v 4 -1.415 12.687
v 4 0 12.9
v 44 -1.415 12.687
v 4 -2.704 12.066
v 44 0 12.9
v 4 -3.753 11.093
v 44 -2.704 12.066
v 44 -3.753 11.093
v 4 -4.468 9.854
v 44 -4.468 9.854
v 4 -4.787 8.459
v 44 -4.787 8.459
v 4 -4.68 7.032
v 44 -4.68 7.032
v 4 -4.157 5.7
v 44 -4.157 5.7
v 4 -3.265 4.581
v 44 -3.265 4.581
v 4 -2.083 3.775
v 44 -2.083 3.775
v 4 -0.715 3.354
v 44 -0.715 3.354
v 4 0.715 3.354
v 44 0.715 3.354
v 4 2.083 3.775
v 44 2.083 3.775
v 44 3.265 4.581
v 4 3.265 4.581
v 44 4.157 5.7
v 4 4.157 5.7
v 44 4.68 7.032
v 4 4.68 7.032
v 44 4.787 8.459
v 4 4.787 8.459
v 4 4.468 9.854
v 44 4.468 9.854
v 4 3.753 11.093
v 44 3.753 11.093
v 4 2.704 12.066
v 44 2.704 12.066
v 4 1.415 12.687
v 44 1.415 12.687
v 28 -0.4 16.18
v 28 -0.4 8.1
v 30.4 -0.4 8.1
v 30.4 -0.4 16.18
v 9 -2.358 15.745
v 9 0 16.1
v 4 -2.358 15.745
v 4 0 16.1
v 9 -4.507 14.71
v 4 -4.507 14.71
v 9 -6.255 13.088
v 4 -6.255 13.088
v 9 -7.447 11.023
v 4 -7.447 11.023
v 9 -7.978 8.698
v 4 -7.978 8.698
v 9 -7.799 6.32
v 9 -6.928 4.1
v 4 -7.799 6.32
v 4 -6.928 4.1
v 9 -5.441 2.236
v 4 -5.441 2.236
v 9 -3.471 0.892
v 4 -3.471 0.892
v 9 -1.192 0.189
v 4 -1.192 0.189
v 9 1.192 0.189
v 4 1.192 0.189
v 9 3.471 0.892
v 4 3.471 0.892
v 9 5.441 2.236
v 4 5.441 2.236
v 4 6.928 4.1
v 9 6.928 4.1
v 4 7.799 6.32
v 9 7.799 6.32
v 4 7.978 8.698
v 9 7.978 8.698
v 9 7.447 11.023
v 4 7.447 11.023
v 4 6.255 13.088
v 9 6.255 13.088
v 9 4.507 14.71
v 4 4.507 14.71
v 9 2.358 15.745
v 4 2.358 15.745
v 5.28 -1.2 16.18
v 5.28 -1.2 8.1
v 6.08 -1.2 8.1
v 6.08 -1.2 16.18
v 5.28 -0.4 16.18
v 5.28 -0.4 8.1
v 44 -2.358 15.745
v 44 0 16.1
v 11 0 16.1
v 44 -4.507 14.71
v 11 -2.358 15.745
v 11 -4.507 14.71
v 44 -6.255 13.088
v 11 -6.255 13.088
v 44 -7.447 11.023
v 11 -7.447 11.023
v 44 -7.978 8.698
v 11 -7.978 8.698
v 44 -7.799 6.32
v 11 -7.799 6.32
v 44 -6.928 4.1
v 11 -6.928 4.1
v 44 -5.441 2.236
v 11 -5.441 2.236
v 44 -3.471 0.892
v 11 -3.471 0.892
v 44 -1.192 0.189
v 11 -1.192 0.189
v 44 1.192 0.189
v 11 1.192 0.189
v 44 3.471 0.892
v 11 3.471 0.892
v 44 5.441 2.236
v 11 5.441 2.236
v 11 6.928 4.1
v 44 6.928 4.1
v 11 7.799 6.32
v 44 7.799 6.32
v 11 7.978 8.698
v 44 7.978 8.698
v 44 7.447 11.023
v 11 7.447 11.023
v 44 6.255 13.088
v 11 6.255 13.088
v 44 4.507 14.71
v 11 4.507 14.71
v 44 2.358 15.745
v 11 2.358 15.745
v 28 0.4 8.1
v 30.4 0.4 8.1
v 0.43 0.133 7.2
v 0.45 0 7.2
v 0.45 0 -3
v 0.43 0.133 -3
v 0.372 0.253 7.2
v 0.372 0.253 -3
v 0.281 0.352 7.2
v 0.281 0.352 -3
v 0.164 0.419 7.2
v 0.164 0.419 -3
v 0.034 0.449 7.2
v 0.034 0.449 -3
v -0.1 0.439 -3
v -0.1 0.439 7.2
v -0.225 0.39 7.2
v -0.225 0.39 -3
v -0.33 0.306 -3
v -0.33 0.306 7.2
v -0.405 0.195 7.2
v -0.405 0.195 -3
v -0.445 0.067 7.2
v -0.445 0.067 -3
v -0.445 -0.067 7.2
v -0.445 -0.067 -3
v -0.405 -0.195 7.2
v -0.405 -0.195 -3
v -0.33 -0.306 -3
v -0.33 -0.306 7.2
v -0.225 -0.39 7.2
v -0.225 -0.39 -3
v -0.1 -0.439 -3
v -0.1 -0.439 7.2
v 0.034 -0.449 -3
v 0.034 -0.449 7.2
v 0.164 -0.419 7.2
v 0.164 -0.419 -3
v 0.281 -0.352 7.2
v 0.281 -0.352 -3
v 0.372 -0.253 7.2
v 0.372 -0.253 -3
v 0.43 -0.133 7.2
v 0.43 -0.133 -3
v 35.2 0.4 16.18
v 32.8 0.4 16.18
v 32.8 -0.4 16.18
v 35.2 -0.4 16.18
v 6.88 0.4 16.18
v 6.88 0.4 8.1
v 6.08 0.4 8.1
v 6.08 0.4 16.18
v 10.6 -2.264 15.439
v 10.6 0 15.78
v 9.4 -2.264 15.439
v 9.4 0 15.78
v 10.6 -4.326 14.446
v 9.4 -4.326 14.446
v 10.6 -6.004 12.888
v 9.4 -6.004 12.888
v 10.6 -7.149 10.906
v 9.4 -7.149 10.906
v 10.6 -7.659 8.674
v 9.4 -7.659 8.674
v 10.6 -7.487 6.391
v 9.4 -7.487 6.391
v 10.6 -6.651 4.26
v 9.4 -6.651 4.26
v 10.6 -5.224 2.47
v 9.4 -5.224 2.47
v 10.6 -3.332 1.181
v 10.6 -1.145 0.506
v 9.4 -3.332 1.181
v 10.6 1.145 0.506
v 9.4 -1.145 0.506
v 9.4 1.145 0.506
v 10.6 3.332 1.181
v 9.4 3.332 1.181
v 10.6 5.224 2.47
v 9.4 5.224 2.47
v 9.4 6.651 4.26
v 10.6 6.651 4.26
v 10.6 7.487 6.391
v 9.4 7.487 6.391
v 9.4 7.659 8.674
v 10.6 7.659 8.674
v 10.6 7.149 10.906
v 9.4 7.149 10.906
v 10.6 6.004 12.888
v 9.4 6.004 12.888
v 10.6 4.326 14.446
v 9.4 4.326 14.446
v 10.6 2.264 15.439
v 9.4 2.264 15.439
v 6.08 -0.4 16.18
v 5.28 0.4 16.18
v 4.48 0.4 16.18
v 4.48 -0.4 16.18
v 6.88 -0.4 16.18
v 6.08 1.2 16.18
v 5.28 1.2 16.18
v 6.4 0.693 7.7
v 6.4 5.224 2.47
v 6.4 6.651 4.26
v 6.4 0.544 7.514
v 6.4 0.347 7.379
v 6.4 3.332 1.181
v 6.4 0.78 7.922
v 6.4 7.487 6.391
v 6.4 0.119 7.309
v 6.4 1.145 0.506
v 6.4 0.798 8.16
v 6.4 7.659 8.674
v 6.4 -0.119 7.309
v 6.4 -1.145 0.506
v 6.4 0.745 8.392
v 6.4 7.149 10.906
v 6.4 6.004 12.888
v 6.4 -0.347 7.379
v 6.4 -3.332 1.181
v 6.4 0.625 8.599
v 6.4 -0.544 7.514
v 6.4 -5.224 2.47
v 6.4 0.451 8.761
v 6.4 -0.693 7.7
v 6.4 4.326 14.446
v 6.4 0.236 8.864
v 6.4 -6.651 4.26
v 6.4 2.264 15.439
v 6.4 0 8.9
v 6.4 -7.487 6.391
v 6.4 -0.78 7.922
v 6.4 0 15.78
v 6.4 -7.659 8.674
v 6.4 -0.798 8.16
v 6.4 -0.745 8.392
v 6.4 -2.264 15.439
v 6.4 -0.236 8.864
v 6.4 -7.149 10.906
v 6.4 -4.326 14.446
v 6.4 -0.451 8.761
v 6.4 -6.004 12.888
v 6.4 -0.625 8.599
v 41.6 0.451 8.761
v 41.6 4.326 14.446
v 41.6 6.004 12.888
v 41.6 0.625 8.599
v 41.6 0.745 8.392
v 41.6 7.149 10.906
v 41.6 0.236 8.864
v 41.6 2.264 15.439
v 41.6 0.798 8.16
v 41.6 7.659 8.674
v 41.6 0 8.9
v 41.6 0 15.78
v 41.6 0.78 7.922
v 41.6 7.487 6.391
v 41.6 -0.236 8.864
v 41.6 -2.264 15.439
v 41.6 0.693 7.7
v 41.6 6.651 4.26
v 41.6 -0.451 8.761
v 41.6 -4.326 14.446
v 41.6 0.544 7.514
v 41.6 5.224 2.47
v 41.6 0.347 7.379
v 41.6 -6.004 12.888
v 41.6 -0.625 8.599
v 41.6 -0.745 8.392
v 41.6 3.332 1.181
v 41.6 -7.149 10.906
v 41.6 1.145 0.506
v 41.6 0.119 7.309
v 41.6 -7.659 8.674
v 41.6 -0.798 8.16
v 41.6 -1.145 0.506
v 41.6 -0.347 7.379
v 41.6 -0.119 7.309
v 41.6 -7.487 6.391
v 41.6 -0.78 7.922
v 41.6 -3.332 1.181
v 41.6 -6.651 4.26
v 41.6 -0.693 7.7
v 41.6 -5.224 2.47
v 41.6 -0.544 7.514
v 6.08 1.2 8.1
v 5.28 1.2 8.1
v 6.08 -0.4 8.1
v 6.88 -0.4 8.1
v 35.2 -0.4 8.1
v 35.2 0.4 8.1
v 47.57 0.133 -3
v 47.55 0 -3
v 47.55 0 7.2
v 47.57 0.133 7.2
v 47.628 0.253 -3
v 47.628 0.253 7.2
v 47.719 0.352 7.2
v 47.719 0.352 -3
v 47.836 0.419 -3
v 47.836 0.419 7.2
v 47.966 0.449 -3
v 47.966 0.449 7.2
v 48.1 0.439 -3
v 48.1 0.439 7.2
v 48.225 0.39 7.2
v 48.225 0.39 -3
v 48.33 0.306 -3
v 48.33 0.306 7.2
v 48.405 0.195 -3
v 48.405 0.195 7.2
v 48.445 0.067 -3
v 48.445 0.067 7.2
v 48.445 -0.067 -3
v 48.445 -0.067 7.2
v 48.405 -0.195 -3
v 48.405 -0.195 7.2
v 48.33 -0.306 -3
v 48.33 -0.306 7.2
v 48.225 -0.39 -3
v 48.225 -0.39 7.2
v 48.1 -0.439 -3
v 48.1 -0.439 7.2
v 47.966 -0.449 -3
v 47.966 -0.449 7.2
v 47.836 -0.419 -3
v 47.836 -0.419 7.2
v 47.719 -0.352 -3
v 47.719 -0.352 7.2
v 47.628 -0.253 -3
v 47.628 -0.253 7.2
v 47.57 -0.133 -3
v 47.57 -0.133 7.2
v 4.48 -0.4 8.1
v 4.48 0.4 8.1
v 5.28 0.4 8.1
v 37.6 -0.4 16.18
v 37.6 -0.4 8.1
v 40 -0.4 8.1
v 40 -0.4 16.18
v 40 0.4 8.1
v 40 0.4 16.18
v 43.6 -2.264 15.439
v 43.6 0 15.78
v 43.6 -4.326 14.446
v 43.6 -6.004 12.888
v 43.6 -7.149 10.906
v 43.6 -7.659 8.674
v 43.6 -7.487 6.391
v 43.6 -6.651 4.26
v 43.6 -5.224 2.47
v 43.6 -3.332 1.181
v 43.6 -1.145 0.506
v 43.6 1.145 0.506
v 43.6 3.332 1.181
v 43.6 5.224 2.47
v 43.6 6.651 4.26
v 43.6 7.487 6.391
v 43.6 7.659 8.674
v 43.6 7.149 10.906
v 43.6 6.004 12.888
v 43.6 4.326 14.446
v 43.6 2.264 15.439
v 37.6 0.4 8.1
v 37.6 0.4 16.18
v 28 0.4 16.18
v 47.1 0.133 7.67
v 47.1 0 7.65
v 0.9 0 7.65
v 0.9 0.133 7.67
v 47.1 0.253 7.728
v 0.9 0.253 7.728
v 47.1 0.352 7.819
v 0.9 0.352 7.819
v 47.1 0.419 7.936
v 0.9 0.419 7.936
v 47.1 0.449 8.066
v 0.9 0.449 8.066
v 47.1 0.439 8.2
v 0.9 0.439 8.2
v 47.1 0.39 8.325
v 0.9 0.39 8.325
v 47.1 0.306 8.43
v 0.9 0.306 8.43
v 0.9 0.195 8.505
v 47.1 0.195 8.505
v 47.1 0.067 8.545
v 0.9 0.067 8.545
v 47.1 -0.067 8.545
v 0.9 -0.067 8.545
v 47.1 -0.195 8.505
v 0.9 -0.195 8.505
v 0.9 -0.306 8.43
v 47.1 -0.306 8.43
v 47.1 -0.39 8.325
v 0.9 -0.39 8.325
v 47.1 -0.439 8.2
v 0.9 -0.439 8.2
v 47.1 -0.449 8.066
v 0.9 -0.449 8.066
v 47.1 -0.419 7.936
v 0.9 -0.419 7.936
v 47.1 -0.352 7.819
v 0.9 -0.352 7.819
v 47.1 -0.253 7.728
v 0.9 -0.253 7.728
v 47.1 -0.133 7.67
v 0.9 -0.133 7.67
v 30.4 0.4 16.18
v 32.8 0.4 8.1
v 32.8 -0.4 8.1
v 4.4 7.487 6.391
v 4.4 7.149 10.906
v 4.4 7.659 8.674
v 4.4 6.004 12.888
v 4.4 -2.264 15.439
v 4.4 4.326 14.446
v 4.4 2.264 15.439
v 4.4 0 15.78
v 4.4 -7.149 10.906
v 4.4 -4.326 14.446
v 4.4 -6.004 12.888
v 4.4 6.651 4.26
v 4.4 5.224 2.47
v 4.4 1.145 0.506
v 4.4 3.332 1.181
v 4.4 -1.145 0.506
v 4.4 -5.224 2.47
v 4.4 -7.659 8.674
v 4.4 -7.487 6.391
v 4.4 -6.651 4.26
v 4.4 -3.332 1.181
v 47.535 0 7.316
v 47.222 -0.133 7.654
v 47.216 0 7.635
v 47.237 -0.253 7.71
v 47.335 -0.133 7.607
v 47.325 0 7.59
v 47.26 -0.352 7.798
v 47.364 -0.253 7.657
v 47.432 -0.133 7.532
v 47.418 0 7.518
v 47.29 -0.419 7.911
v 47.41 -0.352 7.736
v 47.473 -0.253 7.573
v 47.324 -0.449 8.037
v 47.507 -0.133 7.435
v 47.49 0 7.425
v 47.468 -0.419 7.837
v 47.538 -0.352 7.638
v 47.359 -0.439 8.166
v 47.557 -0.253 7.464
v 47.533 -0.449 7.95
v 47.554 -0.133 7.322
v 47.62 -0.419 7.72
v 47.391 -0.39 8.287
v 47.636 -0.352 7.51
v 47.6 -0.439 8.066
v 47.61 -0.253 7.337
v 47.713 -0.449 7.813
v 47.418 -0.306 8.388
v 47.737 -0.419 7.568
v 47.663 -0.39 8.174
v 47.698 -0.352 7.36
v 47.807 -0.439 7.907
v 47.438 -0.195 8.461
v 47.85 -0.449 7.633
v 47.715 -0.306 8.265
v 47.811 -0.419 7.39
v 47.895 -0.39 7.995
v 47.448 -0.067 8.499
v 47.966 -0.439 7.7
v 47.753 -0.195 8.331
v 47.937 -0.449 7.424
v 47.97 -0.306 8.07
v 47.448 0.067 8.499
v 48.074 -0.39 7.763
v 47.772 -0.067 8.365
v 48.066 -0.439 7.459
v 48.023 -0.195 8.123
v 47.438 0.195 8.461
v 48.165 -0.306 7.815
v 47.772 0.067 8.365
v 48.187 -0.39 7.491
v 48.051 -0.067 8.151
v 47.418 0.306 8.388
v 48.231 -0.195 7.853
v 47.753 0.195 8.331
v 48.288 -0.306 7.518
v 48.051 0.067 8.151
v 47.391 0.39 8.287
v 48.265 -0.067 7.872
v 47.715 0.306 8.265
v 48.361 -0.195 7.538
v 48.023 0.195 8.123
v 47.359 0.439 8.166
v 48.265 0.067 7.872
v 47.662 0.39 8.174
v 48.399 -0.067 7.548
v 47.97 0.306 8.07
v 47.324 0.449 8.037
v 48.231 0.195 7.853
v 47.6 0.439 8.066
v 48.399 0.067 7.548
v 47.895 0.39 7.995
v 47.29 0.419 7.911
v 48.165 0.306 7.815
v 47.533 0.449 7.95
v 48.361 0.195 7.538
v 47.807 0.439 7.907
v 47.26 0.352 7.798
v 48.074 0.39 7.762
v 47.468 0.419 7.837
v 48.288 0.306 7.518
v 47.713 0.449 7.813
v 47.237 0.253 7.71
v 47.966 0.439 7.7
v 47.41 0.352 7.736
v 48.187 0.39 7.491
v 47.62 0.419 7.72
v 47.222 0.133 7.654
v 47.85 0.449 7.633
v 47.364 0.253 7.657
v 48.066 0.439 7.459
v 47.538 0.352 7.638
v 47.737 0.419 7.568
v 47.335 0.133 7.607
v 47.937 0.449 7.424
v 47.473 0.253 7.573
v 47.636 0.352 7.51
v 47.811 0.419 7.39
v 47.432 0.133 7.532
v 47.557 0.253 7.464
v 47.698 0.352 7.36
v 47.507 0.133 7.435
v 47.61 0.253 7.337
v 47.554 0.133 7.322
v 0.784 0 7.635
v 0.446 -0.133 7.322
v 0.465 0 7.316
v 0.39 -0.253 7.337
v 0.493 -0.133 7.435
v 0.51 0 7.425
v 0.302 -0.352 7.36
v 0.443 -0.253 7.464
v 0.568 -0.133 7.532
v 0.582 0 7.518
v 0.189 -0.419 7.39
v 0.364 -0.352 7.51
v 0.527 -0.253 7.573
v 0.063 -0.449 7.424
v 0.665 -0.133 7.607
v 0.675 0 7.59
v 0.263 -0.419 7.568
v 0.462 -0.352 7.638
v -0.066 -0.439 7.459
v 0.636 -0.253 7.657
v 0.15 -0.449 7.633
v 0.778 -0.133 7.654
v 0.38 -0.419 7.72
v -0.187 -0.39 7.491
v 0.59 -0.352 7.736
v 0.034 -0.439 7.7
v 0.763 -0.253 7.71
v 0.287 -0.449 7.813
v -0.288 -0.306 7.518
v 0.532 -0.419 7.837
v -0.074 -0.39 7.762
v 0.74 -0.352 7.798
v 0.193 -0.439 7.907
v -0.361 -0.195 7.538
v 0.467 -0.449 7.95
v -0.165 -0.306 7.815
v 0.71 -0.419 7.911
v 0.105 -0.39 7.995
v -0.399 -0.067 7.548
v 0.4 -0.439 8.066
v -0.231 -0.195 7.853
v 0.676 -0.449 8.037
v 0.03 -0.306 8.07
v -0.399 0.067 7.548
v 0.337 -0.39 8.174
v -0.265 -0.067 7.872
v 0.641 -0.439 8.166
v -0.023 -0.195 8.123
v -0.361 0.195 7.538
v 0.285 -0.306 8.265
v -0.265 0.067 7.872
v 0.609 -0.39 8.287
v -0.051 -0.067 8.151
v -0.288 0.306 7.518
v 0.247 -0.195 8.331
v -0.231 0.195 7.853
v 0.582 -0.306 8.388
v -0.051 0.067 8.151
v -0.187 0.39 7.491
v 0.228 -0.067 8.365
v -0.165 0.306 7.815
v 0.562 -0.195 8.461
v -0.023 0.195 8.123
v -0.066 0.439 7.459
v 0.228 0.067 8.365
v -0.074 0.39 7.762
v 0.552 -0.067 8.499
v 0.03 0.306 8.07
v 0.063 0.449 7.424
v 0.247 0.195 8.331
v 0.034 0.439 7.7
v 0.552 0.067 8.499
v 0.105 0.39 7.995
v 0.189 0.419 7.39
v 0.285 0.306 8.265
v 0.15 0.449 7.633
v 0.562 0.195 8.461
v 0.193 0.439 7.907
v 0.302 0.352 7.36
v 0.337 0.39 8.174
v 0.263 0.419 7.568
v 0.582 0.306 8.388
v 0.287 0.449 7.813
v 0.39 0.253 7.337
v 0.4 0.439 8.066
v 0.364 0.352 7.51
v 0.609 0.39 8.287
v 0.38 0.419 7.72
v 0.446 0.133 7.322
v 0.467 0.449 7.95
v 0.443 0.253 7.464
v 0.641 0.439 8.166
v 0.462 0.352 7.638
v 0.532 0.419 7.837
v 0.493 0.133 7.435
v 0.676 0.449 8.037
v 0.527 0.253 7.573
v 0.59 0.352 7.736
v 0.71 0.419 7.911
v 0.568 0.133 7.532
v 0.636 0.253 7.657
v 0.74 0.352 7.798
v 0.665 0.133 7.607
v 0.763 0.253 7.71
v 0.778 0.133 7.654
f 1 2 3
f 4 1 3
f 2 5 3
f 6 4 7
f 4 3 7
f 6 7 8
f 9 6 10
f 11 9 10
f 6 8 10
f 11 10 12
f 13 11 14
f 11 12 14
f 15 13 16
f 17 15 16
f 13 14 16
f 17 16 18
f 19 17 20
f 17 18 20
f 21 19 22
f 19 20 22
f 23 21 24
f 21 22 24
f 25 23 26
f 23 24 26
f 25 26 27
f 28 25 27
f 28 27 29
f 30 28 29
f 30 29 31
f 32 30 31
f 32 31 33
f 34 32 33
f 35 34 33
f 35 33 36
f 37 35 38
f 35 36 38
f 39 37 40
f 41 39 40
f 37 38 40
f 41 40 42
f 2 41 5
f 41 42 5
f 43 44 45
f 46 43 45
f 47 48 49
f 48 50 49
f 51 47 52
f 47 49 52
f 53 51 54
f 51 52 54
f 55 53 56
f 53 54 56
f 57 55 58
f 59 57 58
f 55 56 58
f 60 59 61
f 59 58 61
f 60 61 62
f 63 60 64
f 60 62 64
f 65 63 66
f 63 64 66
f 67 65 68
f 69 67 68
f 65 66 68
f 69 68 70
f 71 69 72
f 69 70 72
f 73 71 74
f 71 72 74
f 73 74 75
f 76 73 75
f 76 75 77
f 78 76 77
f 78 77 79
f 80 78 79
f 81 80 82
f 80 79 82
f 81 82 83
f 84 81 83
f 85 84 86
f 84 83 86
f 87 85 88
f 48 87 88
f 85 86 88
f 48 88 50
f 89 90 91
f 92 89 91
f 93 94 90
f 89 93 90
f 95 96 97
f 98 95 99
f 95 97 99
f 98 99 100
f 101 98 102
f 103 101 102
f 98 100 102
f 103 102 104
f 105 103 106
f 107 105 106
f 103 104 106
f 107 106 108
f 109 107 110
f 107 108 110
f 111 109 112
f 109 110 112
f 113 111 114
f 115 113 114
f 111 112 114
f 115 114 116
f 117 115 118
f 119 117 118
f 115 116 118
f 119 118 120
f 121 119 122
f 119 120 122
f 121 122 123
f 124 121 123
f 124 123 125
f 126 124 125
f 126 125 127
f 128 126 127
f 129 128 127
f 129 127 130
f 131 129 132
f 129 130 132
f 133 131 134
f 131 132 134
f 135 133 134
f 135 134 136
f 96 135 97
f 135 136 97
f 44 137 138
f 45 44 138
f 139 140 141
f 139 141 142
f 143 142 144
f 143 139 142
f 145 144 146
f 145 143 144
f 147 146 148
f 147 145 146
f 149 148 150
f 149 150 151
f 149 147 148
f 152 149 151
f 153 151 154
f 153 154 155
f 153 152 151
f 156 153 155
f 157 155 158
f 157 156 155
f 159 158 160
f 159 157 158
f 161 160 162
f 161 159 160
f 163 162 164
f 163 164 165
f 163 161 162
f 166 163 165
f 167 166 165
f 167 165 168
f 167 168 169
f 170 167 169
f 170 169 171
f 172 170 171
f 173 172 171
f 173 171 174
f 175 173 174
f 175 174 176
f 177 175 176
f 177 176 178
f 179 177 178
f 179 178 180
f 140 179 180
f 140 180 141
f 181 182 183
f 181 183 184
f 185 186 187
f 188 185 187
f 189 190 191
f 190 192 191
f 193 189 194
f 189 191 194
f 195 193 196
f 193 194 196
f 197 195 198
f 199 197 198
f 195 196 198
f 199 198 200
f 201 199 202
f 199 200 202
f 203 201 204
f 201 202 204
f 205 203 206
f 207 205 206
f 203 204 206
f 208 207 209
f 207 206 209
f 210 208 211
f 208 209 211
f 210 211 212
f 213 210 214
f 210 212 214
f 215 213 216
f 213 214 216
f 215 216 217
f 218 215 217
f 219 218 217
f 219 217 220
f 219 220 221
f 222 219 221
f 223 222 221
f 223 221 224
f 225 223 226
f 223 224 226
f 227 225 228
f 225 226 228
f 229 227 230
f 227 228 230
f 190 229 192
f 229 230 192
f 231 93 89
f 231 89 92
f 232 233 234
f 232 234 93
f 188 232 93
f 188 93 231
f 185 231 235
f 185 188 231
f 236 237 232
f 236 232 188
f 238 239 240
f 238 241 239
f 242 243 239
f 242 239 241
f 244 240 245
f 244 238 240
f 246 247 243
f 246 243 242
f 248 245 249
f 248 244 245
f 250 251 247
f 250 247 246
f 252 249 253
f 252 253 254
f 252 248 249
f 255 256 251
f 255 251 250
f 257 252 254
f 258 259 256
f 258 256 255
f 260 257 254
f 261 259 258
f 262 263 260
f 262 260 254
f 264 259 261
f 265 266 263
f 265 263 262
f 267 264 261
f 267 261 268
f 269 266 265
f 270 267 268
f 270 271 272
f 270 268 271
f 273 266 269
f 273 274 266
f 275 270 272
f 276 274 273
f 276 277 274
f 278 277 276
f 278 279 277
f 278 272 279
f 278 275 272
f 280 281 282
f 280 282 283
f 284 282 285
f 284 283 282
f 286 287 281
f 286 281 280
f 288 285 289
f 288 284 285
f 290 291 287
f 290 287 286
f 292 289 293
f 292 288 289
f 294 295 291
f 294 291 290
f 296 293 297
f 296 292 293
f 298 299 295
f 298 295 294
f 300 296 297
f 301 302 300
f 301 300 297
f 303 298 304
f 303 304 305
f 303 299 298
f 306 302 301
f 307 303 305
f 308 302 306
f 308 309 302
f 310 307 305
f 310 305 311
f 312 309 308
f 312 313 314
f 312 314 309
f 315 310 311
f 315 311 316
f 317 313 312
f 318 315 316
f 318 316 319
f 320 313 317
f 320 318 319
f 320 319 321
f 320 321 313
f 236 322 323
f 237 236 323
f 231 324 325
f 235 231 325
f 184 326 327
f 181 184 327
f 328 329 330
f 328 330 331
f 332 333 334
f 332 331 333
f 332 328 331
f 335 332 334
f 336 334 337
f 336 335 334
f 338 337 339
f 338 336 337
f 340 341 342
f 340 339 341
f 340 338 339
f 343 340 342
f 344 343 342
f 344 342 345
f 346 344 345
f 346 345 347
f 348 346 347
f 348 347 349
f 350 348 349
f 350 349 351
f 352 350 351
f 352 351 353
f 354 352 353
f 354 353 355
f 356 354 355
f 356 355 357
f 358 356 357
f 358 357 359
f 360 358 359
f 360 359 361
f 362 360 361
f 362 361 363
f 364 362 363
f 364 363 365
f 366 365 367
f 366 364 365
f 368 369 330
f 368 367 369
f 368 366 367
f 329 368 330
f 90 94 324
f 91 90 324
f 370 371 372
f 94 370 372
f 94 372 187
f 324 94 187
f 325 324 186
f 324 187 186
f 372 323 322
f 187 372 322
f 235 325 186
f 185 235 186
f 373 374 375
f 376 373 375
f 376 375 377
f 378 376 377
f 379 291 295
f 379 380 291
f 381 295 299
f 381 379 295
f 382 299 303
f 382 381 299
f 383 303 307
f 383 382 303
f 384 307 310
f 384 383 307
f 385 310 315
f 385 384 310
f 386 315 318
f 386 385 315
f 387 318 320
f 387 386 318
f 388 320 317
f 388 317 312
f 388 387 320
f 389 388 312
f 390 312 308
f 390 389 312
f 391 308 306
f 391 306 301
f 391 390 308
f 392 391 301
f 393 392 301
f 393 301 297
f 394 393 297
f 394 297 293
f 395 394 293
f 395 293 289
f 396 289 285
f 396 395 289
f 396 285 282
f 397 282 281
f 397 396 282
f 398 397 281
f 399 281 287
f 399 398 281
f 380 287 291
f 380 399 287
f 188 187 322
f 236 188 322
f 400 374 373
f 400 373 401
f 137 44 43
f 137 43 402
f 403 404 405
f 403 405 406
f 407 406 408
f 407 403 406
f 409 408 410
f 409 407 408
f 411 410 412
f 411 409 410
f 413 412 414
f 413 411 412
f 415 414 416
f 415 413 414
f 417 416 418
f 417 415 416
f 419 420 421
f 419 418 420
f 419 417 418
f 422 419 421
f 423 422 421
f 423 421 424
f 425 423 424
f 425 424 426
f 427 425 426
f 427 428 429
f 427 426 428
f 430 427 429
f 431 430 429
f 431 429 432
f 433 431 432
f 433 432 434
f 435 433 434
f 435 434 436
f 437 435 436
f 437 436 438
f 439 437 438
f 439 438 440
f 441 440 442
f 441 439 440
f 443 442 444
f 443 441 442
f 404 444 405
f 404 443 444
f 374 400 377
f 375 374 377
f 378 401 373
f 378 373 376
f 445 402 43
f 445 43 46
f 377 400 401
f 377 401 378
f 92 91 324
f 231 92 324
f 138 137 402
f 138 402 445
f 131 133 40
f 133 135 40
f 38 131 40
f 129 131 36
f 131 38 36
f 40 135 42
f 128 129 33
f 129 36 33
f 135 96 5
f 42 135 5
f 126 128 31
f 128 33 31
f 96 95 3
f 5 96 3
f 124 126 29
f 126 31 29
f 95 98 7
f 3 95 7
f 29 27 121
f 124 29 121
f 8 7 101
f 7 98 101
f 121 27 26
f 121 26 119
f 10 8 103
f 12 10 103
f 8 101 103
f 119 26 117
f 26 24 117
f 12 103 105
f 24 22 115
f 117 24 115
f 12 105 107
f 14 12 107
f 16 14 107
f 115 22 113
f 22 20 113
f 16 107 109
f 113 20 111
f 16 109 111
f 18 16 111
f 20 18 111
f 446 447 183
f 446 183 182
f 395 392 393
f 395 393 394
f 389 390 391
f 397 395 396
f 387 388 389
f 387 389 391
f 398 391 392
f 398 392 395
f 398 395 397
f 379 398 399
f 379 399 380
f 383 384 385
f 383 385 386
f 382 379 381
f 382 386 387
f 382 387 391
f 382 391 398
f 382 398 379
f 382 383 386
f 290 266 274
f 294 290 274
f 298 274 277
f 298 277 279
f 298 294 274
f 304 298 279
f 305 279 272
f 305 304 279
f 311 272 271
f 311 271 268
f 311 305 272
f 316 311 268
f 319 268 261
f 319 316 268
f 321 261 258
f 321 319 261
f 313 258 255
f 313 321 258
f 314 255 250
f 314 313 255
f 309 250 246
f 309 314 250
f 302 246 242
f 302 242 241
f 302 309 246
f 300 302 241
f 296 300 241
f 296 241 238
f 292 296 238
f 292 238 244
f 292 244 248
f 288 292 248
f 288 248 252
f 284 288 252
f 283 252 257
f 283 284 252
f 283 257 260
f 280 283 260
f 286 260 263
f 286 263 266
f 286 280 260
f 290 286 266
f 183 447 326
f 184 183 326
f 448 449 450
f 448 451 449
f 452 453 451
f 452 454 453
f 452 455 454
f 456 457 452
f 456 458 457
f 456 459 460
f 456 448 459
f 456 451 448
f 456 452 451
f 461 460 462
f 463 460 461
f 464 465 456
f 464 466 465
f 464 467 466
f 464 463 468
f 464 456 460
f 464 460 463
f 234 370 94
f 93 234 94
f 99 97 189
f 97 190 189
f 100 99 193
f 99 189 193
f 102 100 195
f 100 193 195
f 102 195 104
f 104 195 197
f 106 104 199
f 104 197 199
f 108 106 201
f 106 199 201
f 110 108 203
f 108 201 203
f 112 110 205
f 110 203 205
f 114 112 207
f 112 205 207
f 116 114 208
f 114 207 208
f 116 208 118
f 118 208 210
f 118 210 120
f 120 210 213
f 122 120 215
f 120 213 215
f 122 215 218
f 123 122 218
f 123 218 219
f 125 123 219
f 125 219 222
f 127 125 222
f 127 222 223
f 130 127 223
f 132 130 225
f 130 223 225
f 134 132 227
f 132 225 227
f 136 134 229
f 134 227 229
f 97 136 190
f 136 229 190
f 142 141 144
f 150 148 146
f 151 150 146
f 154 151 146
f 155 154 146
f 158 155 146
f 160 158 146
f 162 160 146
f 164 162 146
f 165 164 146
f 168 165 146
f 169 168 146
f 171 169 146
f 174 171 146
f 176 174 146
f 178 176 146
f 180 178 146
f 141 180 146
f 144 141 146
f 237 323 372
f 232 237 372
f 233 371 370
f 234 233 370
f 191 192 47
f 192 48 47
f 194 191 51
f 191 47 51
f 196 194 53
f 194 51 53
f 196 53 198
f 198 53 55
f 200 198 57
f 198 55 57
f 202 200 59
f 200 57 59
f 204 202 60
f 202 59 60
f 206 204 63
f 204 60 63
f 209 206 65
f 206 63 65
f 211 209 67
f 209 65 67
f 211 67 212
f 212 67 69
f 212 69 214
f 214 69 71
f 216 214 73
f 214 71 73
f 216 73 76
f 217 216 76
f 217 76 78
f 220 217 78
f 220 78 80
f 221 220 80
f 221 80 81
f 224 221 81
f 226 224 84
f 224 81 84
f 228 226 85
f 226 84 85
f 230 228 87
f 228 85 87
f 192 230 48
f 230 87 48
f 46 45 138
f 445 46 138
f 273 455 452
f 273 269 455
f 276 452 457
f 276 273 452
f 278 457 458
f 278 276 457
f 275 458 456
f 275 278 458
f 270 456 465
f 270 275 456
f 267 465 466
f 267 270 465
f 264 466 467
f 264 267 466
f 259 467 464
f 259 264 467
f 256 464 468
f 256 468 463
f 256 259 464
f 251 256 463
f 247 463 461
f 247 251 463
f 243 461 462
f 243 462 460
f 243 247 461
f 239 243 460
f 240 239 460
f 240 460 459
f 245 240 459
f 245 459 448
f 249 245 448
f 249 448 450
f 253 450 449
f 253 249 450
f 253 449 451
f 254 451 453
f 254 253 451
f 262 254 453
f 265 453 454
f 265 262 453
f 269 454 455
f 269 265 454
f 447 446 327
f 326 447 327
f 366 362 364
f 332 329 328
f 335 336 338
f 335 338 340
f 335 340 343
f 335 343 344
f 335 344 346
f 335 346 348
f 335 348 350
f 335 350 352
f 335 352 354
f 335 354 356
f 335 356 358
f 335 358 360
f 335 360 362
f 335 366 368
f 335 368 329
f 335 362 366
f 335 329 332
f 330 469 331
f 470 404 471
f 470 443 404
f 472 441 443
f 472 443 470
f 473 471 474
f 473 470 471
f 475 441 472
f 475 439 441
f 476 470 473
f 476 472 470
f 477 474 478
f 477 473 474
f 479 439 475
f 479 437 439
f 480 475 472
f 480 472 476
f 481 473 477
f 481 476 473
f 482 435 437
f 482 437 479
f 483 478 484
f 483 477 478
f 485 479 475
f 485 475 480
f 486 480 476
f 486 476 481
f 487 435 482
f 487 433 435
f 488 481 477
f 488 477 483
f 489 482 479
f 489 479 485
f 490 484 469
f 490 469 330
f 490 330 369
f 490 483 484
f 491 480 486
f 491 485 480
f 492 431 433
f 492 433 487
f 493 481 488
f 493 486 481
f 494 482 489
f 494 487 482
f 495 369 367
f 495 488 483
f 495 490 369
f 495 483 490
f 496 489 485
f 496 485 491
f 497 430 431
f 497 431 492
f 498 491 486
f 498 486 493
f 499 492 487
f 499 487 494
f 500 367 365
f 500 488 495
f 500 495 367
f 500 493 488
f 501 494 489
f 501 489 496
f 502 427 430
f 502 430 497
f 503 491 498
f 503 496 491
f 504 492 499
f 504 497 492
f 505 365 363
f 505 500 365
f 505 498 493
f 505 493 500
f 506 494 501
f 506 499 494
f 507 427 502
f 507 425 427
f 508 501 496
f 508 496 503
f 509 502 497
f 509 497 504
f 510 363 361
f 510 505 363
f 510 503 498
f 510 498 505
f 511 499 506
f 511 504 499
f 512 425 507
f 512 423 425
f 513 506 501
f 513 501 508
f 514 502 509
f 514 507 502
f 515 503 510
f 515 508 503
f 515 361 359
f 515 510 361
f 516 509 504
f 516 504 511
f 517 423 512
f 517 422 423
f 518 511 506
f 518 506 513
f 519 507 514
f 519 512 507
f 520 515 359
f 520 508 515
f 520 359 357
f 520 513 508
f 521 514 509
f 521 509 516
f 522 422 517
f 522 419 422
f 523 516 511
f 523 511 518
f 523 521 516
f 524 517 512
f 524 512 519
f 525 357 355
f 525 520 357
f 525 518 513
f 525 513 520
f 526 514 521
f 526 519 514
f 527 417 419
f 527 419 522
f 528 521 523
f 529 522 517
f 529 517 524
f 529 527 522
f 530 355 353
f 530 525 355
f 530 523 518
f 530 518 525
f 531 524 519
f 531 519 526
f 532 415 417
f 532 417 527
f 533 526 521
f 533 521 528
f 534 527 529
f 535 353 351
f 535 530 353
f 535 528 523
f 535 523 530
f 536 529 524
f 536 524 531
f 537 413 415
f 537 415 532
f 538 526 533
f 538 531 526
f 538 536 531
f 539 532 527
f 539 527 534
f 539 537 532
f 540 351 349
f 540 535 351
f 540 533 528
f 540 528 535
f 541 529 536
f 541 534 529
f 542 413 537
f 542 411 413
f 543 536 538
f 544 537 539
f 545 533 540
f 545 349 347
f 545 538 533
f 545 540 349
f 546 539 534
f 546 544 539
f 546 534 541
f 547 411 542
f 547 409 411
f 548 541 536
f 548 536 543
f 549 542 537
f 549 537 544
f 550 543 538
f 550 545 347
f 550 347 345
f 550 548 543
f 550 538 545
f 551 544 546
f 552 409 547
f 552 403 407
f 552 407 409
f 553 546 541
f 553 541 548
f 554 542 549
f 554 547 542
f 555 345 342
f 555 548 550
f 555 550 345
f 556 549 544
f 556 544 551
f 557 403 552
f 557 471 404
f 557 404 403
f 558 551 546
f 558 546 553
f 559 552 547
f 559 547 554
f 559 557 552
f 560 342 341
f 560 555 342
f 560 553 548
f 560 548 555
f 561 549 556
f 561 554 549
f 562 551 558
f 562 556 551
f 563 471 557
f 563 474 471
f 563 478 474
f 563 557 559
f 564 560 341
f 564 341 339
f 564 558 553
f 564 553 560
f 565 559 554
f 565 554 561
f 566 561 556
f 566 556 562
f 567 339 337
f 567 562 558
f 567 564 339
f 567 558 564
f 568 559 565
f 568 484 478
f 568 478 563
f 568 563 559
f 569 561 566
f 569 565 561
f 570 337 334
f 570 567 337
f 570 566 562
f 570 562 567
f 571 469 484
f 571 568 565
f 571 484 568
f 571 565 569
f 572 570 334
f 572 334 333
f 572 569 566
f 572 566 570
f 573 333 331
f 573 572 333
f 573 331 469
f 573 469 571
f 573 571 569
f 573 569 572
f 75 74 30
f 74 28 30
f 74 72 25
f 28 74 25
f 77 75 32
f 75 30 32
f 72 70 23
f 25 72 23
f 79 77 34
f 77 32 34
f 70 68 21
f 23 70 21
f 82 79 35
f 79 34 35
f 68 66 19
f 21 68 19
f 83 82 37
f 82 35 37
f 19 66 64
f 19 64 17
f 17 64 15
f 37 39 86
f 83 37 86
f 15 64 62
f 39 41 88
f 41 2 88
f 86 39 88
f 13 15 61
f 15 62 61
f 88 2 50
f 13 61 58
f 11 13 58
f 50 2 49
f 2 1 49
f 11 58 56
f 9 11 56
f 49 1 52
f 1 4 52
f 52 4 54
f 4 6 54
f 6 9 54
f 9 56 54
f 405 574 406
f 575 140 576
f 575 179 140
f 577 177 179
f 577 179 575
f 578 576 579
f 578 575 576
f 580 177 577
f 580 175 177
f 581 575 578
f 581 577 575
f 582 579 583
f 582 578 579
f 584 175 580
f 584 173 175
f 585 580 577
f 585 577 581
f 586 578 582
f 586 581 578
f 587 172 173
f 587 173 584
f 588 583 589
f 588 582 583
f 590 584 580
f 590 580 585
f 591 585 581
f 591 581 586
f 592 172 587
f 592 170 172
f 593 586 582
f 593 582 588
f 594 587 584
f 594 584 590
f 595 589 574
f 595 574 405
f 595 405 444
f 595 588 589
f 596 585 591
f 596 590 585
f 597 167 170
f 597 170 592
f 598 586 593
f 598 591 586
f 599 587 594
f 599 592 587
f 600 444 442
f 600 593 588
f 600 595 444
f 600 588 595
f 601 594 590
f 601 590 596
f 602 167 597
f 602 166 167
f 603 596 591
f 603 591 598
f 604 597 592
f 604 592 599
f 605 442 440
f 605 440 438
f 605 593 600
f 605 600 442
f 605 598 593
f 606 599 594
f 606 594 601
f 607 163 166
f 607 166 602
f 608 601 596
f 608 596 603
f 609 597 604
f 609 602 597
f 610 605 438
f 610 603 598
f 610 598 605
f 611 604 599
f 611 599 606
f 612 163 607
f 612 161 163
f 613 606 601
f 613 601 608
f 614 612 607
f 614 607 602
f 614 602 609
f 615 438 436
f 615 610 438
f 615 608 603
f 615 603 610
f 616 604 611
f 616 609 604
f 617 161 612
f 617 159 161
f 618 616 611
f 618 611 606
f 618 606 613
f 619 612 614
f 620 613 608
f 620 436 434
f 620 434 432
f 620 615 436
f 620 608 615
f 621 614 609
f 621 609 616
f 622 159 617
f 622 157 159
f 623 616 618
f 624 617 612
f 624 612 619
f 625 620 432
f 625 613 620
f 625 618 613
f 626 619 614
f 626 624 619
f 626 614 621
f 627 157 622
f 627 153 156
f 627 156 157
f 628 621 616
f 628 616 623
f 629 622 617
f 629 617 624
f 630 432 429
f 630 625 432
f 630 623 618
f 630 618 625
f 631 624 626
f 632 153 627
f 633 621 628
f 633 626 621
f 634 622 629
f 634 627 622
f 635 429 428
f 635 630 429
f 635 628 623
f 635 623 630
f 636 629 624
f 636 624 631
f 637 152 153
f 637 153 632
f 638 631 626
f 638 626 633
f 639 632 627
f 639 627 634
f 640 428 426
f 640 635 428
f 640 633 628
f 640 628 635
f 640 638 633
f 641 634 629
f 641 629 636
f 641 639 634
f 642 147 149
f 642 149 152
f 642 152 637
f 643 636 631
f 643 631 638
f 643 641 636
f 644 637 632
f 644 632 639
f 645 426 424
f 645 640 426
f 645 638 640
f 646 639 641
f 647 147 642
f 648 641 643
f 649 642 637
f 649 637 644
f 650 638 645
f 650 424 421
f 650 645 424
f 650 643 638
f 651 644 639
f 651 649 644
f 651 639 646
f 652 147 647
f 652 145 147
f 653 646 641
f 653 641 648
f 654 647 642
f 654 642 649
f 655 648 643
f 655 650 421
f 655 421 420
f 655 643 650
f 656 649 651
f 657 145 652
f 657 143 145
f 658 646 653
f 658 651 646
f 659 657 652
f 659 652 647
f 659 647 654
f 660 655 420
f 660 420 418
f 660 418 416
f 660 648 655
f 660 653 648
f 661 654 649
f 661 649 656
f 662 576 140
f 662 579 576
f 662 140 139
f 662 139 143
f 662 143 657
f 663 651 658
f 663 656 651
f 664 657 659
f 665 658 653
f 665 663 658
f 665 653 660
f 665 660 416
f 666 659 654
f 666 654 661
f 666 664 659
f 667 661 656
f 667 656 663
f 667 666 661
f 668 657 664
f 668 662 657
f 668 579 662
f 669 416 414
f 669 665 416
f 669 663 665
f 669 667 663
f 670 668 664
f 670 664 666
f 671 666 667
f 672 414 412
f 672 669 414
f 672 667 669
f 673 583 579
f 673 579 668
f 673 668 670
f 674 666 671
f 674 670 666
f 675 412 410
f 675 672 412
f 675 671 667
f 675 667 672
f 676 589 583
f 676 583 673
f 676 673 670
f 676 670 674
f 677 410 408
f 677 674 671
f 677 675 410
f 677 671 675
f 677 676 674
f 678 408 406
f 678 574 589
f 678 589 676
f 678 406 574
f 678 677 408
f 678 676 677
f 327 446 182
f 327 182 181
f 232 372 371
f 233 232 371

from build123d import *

# Parameters (mm, degrees)
SKETCH_R    = 0.45
SKETCH004_W = 2.4
SKETCH004_H = 0.8
PAD_DEPTH   = 8.08


with BuildPart() as sweep_body:
    # Sweep: sweep along a path in Sketch001
    with BuildLine(Plane.XZ) as sweep_path:
        Line((0, -3), (0, 7.2))
        ThreePointArc((0, 7.2), (0.263601, 7.836394), (0.899993, 8.1))
        Line((0.899993, 8.1), (47.1, 8.1))
        ThreePointArc((47.1, 8.1), (47.736396, 7.836396), (48, 7.2))
        Line((48, 7.2), (48, -3))
    # Sketch → Sweep (sweep)
    with BuildSketch(Plane.XY.offset(-2)):
        Circle(SKETCH_R)
    sweep(path=sweep_path.line)


with BuildPart() as revolution:
    # Sketch002 → Revolution (revolve)
    with BuildSketch(Plane.XZ):
        Polygon((4, 16.1), (4, 12.9), (44, 12.9), (44, 16.1), (11, 16.1), (10.6, 15.78), (9.4, 15.78), (9, 16.1), align=None)
    revolve(axis=Axis((6.97588, 0, 8.1), (1, 0, 0)))


with BuildPart() as revolution001:
    # Sketch003 → Revolution001 (revolve)
    with BuildSketch(Plane.XZ):
        Polygon((4.4, 15.78), (6.4, 15.78), (6.4, 8.9), (41.6, 8.9), (41.6, 15.78), (43.6, 15.78), (43.6, 8.1), (4.4, 8.1), align=None)
    revolve(axis=Axis((6.97588, 0, 8.1), (1, 0, 0)))


with BuildPart() as pad:
    # Sketch004 → Pad (new body)
    with BuildSketch(Plane.XY.offset(8.1)):
        with Locations((38.8, 0)):
            Rectangle(SKETCH004_W, SKETCH004_H)
        with Locations((34, 0)):
            Rectangle(SKETCH004_W, SKETCH004_H)
        with Locations((29.2, 0)):
            Rectangle(SKETCH004_W, SKETCH004_H)
        Polygon((5.28, 0.4), (4.48, 0.4), (4.48, -0.4), (5.28, -0.4), (5.28, -1.2), (6.08, -1.2), (6.08, -0.4), (6.88, -0.4), (6.88, 0.4), (6.08, 0.4), (6.08, 1.2), (5.28, 1.2), align=None)
    extrude(amount=PAD_DEPTH)


solid = Compound([sweep_body.part, revolution.part, revolution001.part, pad.part])
